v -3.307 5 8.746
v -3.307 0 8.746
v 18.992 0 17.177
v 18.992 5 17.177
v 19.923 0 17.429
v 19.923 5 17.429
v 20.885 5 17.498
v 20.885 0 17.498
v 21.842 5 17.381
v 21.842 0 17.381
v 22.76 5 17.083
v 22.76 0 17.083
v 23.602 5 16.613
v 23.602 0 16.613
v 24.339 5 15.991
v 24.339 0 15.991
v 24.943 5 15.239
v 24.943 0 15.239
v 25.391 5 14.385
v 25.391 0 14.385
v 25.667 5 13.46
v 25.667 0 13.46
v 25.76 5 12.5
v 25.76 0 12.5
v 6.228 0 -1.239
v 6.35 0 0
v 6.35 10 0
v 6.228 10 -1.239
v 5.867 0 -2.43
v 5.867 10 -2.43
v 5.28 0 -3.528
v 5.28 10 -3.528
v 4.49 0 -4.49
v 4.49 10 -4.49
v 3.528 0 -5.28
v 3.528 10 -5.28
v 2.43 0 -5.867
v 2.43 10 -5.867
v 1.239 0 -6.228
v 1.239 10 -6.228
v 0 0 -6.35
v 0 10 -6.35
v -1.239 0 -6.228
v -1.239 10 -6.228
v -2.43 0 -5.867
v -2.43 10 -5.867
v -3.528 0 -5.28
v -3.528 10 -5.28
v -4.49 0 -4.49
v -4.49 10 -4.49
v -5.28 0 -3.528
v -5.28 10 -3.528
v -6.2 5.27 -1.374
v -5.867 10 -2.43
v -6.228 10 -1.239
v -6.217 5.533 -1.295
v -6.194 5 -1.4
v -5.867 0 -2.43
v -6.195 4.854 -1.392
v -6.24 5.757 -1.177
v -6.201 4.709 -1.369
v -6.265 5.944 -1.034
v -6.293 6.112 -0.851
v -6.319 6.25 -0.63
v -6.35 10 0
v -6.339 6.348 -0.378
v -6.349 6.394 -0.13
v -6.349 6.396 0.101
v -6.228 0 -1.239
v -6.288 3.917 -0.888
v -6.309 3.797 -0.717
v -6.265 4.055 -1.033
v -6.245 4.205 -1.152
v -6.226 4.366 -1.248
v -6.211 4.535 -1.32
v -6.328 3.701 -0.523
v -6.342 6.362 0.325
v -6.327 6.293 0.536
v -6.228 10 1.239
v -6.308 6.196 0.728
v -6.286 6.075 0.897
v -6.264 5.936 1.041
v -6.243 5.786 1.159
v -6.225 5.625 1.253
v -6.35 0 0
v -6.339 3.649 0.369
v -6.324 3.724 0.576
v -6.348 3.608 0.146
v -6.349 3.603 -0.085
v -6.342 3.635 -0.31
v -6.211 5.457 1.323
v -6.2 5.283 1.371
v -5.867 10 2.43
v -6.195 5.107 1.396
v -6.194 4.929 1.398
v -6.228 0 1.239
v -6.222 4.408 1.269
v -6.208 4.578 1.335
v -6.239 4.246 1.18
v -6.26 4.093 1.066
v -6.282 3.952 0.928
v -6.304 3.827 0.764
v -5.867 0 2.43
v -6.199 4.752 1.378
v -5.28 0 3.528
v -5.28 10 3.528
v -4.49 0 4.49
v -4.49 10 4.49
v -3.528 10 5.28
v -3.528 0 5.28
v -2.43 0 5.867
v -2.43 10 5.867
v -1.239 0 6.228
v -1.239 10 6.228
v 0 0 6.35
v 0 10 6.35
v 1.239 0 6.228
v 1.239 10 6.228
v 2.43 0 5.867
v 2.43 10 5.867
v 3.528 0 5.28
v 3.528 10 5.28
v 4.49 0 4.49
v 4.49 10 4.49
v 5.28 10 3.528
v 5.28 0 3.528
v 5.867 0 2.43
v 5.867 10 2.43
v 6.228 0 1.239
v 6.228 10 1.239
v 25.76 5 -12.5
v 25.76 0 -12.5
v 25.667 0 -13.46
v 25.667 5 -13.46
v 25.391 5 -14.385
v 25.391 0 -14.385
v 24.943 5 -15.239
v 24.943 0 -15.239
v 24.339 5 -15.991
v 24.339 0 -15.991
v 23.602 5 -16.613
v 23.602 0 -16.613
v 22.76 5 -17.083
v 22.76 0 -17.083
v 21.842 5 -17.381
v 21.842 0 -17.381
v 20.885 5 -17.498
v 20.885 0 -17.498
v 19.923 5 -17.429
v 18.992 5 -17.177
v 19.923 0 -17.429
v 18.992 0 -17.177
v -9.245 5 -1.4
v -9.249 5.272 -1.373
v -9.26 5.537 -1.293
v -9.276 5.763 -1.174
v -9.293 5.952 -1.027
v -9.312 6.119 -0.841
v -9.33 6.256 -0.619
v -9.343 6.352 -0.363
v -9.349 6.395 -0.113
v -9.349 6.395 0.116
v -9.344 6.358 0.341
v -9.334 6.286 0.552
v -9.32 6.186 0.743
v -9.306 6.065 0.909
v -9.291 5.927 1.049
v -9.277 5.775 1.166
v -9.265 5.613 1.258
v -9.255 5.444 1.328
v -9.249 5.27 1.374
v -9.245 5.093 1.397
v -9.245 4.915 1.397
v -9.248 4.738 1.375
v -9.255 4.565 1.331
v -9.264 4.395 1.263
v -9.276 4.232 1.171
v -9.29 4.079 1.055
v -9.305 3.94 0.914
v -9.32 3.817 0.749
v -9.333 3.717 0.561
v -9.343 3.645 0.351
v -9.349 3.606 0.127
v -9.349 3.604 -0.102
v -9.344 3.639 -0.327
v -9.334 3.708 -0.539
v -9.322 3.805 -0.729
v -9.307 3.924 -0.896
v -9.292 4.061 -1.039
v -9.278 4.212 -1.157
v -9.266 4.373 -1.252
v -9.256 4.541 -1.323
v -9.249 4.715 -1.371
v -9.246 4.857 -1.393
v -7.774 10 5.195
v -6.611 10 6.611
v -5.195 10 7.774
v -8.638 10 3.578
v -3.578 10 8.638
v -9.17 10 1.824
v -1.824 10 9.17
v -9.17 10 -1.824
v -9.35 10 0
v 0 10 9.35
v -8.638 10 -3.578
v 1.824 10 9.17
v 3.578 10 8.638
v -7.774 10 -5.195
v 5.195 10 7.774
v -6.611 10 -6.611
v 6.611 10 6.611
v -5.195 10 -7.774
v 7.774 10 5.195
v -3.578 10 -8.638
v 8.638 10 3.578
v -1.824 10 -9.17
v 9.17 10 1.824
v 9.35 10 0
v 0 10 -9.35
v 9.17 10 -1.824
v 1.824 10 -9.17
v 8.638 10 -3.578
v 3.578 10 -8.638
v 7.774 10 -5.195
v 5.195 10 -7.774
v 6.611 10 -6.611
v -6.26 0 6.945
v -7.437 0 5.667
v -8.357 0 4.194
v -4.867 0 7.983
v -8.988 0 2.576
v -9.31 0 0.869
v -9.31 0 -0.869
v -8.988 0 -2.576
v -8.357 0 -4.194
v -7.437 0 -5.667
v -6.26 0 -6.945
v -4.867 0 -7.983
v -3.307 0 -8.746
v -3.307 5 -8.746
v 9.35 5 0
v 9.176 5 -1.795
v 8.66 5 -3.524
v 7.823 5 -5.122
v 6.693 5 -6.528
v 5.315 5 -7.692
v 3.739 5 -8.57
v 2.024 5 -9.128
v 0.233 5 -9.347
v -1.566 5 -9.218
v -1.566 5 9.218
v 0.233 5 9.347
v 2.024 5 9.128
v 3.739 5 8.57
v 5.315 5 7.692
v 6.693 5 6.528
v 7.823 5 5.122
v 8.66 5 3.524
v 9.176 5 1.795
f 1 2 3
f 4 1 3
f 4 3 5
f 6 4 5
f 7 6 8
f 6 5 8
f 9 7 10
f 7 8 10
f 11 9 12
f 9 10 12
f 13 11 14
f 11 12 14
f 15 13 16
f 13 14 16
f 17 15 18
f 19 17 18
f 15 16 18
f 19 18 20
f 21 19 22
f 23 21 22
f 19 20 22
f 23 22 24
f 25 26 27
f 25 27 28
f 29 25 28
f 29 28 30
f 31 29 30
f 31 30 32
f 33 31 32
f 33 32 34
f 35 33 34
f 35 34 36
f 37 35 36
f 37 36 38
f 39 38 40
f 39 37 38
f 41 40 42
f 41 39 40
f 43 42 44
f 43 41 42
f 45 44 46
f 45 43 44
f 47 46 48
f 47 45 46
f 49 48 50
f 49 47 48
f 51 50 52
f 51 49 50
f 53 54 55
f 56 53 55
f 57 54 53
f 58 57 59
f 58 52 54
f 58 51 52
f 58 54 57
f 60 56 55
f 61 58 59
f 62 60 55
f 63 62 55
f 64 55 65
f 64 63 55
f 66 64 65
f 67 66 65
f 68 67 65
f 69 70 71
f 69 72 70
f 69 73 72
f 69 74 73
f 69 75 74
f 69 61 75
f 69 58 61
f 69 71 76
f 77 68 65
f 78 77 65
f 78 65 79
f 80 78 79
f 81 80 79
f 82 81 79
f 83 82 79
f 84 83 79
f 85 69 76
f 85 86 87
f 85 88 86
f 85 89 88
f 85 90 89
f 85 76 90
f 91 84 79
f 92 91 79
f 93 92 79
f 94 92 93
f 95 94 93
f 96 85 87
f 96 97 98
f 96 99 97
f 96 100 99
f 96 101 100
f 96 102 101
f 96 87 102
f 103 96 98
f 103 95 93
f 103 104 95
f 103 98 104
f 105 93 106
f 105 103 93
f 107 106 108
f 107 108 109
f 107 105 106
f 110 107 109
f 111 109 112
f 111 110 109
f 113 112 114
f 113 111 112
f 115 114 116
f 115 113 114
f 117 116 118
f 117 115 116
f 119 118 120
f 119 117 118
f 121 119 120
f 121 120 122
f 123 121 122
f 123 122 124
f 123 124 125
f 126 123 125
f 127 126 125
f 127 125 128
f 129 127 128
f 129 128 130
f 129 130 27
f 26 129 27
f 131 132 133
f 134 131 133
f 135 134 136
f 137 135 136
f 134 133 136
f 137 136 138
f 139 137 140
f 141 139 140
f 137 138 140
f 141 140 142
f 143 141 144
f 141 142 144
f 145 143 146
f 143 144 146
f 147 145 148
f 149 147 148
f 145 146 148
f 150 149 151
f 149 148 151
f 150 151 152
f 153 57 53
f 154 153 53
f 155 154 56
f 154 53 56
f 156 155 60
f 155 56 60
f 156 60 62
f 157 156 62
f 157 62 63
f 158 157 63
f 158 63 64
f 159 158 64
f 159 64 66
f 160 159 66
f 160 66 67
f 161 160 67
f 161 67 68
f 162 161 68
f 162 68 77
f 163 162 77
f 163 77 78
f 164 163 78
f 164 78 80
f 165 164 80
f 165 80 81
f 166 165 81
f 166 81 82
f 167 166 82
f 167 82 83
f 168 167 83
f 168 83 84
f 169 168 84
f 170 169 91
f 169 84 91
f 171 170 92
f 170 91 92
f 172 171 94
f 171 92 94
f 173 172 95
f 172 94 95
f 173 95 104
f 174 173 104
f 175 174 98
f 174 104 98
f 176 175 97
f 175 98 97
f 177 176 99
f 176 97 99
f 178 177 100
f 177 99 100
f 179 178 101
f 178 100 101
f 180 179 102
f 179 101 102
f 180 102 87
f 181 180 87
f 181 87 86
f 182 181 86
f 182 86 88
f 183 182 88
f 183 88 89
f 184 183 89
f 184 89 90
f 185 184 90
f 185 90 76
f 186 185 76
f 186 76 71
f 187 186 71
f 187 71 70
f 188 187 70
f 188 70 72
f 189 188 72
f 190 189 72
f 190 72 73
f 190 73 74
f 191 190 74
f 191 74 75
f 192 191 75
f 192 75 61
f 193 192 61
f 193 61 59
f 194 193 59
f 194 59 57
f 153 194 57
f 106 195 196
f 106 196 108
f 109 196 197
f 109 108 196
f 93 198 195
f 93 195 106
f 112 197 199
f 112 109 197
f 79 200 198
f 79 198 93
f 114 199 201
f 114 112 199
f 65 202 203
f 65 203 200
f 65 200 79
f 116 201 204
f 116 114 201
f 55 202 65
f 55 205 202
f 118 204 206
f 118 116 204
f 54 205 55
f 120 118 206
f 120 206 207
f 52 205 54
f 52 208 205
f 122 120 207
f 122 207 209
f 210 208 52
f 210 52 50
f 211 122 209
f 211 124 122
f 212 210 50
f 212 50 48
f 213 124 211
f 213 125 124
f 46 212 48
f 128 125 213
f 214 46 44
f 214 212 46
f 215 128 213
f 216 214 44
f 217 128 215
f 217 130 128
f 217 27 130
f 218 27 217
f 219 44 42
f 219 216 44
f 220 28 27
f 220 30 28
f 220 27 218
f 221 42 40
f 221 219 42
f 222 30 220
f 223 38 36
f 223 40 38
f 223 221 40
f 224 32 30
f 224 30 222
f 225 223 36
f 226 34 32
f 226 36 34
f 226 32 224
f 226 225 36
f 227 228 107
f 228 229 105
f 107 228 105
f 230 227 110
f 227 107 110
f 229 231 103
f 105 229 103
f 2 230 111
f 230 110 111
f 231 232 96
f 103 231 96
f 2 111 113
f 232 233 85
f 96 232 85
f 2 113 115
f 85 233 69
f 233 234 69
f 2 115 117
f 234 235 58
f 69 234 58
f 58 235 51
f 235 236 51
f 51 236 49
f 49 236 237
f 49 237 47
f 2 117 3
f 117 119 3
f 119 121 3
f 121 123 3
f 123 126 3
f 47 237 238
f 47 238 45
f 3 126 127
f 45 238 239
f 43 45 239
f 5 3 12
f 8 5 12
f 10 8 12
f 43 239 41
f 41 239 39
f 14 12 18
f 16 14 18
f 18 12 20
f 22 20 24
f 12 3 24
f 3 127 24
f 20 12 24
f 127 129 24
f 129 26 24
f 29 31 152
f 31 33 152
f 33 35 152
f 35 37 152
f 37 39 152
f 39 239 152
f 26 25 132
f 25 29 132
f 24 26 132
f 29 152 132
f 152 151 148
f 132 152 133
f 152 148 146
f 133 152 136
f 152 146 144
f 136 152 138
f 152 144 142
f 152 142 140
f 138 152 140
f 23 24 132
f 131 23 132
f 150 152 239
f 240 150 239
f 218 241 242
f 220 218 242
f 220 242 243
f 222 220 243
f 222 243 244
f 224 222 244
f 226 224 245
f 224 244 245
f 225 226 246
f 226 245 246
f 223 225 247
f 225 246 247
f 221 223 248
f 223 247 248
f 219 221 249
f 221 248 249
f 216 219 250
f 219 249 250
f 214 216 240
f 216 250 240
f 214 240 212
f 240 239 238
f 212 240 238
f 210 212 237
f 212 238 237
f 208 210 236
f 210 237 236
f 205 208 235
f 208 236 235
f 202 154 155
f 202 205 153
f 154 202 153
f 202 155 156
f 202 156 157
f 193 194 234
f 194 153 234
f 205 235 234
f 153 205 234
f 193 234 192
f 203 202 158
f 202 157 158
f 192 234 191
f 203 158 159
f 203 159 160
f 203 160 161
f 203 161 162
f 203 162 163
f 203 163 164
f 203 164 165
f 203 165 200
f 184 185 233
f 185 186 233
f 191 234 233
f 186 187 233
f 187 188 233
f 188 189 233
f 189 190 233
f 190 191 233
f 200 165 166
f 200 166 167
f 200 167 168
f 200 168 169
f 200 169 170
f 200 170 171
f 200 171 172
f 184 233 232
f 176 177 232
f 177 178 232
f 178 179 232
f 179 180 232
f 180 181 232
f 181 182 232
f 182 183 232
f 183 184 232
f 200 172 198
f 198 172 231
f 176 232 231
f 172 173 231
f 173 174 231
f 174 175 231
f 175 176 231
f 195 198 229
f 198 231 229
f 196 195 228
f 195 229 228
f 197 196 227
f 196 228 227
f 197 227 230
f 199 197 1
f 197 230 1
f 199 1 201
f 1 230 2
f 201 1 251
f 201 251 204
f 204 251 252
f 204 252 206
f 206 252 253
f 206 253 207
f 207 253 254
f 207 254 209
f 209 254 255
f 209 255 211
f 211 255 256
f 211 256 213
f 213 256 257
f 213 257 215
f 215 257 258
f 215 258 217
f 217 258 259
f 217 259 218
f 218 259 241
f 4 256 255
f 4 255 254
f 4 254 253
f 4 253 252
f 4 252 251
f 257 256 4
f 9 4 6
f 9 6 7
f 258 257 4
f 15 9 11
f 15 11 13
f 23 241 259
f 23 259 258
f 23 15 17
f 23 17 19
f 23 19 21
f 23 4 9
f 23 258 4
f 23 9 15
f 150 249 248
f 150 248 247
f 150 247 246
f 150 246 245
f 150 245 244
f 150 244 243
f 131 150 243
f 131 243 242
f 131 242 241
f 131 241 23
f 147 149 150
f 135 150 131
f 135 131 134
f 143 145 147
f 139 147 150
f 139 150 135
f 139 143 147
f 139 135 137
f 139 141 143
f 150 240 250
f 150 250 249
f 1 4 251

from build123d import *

# Parameters (mm, degrees)
SKETCH1_R           = 6.35
BOSS_EXTRUDE1_DEPTH = 5
SKETCH1_3_R         = 6.35
BOSS_EXTRUDE2_DEPTH = 10
SKETCH2_R           = 1.4
CUT_EXTRUDE1_DEPTH  = 33.708219151


with BuildPart() as part:
    # Sketch1 → Boss-Extrude1 (new body)
    with BuildSketch(Plane(origin=(0, 0, 0), x_dir=(1, 0, 0), z_dir=(0, 1, 0))):
        with BuildLine():
            Line((18.991661947, 17.176855838), (-3.306792159, 8.745720417))
            ThreePointArc((-3.306792159, 8.745720417), (-9.35, 0), (-3.306792159, -8.745720417))
            Line((-3.306792159, -8.745720417), (18.991661947, -17.176855838))
            ThreePointArc((18.991661947, -17.176855838), (23.602385419, -16.613495488), (25.76, -12.5))
            Line((25.76, -12.5), (25.76, 12.5))
            ThreePointArc((25.76, 12.5), (23.602385419, 16.613495488), (18.991661947, 17.176855838))
        make_face()
        Circle(SKETCH1_R, mode=Mode.SUBTRACT)
    extrude(amount=BOSS_EXTRUDE1_DEPTH)

    # Sketch1<3> → Boss-Extrude2 (add)
    with BuildSketch(Plane(origin=(0, 0, 0), x_dir=(1, 0, 0), z_dir=(0, 1, 0))):
        with BuildLine():
            ThreePointArc((9.35, 0), (5.315260733, 7.692236563), (-3.306792159, 8.745720417))
            ThreePointArc((-3.306792159, 8.745720417), (-9.35, 0), (-3.306792159, -8.745720417))
            ThreePointArc((-3.306792159, -8.745720417), (5.315260733, -7.692236563), (9.35, 0))
        make_face()
        Circle(SKETCH1_3_R, mode=Mode.SUBTRACT)
    extrude(amount=BOSS_EXTRUDE2_DEPTH)

    # Sketch2 → Cut-Extrude1 (cut, through all)
    with BuildSketch(Plane(origin=(0, 0, 0), x_dir=(0, 0, -1), z_dir=(1, 0, 0))):
        with Locations((0, 5)):
            Circle(SKETCH2_R)
    extrude(amount=-CUT_EXTRUDE1_DEPTH, mode=Mode.SUBTRACT)


solid = part.part
